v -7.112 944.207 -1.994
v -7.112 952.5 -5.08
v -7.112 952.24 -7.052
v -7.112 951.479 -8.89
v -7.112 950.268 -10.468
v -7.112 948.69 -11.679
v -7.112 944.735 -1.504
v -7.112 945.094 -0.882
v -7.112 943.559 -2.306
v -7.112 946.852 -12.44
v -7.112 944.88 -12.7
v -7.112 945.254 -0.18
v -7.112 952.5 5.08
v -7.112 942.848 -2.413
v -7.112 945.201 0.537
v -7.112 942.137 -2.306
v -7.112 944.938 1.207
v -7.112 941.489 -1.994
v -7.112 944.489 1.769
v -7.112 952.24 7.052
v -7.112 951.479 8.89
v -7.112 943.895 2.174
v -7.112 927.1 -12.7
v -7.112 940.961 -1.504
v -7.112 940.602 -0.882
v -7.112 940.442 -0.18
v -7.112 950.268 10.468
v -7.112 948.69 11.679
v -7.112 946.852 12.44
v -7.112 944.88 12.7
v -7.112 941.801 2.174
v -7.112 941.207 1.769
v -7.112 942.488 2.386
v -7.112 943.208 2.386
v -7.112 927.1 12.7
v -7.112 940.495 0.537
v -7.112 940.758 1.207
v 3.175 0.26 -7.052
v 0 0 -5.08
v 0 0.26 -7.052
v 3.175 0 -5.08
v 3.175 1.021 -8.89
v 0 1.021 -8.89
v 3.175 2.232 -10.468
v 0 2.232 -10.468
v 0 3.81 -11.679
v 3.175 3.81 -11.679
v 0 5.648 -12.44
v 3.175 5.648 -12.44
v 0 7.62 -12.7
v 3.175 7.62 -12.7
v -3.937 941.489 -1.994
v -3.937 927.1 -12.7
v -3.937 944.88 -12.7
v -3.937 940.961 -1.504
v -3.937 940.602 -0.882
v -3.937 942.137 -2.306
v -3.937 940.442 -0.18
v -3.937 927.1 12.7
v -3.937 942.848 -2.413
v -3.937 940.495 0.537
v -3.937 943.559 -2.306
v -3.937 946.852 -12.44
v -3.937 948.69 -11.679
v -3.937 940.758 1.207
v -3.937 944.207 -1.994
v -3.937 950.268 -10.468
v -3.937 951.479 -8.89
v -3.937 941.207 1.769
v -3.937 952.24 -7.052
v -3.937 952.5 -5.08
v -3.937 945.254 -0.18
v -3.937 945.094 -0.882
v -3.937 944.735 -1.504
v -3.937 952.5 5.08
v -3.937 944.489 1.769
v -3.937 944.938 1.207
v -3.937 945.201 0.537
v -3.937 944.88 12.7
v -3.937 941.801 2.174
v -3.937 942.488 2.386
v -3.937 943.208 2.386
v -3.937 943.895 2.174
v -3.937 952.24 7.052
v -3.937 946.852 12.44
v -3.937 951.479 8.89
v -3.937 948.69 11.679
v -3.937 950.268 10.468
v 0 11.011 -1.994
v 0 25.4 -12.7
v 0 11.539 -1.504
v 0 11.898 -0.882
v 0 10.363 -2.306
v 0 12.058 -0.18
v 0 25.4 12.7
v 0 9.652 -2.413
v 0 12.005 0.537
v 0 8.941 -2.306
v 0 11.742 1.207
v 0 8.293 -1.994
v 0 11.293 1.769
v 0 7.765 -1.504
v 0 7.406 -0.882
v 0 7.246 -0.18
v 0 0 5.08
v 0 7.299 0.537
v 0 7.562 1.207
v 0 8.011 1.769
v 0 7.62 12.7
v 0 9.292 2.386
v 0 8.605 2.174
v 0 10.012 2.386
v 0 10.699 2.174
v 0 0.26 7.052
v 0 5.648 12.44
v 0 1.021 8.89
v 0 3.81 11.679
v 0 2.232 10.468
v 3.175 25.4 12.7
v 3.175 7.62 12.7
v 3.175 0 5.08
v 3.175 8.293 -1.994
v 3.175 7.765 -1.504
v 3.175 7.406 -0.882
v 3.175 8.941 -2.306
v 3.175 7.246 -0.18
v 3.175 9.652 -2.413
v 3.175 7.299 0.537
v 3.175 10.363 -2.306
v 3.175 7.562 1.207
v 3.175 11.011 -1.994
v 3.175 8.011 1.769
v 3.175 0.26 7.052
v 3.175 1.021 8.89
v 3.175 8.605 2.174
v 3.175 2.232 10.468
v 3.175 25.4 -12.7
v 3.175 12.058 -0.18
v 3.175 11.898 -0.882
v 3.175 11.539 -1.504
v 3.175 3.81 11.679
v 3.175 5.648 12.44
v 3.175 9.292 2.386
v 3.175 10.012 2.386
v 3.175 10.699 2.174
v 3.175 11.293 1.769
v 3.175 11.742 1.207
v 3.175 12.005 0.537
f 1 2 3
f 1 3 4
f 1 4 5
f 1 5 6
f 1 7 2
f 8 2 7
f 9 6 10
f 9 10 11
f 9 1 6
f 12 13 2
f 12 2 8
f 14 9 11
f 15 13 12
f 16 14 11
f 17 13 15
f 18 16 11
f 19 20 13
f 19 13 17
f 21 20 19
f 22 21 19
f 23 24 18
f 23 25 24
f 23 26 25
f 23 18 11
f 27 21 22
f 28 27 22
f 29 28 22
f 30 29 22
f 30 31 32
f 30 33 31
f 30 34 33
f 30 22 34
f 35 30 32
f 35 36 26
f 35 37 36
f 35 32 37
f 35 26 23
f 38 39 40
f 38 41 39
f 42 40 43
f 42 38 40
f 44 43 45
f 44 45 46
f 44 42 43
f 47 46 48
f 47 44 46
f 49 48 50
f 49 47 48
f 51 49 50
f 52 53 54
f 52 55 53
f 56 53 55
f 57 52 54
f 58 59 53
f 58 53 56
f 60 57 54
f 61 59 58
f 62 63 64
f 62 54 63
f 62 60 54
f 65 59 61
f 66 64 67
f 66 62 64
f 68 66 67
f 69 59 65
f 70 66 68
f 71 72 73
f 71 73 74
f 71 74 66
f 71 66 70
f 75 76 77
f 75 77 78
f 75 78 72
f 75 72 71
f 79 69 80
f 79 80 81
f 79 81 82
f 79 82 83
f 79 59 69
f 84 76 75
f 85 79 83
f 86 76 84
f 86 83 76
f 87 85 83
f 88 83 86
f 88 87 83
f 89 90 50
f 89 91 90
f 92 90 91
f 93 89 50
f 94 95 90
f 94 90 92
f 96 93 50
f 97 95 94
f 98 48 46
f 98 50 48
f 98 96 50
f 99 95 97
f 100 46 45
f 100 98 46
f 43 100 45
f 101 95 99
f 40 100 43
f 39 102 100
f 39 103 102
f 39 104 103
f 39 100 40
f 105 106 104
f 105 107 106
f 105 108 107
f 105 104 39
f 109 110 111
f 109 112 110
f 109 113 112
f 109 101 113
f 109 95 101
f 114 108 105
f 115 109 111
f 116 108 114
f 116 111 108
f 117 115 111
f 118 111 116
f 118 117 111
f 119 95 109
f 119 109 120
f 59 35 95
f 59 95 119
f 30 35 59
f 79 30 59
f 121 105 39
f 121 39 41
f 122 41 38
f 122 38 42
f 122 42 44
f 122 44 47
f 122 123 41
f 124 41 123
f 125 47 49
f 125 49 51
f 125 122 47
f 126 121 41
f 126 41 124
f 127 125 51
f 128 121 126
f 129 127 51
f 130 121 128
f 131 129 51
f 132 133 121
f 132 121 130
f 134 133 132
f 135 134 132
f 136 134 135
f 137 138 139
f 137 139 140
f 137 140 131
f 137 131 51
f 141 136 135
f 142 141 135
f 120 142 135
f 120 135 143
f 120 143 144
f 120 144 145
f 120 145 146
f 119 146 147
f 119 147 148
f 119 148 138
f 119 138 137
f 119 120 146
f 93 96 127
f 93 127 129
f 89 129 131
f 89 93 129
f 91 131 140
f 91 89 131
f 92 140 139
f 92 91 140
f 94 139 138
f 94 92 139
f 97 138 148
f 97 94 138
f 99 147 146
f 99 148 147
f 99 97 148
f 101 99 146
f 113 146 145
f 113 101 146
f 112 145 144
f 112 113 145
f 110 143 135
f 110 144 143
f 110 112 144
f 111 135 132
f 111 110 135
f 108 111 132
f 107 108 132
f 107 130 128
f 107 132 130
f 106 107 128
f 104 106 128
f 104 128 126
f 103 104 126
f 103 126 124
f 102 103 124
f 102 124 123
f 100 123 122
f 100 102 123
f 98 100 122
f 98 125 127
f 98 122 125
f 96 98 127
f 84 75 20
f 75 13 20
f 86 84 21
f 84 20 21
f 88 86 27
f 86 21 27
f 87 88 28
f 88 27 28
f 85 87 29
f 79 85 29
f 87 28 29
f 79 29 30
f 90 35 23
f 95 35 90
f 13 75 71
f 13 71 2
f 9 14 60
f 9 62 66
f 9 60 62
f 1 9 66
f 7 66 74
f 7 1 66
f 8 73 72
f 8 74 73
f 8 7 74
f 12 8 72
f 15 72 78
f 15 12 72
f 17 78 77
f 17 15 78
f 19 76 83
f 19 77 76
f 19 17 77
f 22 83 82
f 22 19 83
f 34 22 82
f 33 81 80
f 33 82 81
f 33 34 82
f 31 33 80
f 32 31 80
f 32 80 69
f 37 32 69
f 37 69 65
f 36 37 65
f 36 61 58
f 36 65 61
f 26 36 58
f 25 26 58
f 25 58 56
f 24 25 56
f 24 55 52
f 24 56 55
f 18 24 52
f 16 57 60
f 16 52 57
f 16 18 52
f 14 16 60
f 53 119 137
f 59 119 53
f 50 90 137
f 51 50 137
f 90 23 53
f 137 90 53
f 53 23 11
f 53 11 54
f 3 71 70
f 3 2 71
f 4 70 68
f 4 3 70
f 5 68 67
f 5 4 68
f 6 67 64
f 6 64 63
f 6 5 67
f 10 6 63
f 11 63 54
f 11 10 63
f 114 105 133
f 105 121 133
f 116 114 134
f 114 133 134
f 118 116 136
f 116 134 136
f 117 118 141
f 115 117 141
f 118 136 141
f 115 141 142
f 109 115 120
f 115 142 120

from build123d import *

# Parameters (mm, degrees)
BOSS_EXTRUDE1_DEPTH     = 12.7
FILLET1_R               = 7.62
CUT_EXTRUDE1_DEPTH      = 953.611211641
CUT_EXTRUDE1_DEPTH_BACK = 953.611211641
SKETCH2_R               = 2.413


with BuildPart() as part:
    # Sketch1 → Boss-Extrude1 (new, symmetric)
    with BuildSketch(Plane.XY):
        Polygon((0, 0), (3.175, 0), (3.175, 25.4), (-3.937, 927.1), (-3.937, 952.5), (-7.112, 952.5), (-7.112, 927.1), (0, 25.4), align=None)
    extrude(amount=BOSS_EXTRUDE1_DEPTH, both=True)

    # Fillet1
    fillet1_edges = [part.edges().sort_by_distance(p)[0] for p in [
        (1.5875, 0, -12.7),
        (-5.5245, 952.5, 12.7),
        (1.5875, 0, 12.7),
        (-5.5245, 952.5, -12.7),
    ]]
    fillet(fillet1_edges, radius=FILLET1_R)

    # Sketch2 → Cut-Extrude1 (cut, two sides: drawn at the far end of the back side and taken through both)
    with BuildSketch(Plane(origin=(-3.937, 0, 0), x_dir=(0, 0, -1), z_dir=(1, 0, 0)).offset(-CUT_EXTRUDE1_DEPTH_BACK)):
        with Locations((0, 942.848)):
            Circle(SKETCH2_R)
        with Locations((0, 9.652)):
            Circle(SKETCH2_R)
    extrude(amount=CUT_EXTRUDE1_DEPTH + CUT_EXTRUDE1_DEPTH_BACK, mode=Mode.SUBTRACT)


solid = part.part
